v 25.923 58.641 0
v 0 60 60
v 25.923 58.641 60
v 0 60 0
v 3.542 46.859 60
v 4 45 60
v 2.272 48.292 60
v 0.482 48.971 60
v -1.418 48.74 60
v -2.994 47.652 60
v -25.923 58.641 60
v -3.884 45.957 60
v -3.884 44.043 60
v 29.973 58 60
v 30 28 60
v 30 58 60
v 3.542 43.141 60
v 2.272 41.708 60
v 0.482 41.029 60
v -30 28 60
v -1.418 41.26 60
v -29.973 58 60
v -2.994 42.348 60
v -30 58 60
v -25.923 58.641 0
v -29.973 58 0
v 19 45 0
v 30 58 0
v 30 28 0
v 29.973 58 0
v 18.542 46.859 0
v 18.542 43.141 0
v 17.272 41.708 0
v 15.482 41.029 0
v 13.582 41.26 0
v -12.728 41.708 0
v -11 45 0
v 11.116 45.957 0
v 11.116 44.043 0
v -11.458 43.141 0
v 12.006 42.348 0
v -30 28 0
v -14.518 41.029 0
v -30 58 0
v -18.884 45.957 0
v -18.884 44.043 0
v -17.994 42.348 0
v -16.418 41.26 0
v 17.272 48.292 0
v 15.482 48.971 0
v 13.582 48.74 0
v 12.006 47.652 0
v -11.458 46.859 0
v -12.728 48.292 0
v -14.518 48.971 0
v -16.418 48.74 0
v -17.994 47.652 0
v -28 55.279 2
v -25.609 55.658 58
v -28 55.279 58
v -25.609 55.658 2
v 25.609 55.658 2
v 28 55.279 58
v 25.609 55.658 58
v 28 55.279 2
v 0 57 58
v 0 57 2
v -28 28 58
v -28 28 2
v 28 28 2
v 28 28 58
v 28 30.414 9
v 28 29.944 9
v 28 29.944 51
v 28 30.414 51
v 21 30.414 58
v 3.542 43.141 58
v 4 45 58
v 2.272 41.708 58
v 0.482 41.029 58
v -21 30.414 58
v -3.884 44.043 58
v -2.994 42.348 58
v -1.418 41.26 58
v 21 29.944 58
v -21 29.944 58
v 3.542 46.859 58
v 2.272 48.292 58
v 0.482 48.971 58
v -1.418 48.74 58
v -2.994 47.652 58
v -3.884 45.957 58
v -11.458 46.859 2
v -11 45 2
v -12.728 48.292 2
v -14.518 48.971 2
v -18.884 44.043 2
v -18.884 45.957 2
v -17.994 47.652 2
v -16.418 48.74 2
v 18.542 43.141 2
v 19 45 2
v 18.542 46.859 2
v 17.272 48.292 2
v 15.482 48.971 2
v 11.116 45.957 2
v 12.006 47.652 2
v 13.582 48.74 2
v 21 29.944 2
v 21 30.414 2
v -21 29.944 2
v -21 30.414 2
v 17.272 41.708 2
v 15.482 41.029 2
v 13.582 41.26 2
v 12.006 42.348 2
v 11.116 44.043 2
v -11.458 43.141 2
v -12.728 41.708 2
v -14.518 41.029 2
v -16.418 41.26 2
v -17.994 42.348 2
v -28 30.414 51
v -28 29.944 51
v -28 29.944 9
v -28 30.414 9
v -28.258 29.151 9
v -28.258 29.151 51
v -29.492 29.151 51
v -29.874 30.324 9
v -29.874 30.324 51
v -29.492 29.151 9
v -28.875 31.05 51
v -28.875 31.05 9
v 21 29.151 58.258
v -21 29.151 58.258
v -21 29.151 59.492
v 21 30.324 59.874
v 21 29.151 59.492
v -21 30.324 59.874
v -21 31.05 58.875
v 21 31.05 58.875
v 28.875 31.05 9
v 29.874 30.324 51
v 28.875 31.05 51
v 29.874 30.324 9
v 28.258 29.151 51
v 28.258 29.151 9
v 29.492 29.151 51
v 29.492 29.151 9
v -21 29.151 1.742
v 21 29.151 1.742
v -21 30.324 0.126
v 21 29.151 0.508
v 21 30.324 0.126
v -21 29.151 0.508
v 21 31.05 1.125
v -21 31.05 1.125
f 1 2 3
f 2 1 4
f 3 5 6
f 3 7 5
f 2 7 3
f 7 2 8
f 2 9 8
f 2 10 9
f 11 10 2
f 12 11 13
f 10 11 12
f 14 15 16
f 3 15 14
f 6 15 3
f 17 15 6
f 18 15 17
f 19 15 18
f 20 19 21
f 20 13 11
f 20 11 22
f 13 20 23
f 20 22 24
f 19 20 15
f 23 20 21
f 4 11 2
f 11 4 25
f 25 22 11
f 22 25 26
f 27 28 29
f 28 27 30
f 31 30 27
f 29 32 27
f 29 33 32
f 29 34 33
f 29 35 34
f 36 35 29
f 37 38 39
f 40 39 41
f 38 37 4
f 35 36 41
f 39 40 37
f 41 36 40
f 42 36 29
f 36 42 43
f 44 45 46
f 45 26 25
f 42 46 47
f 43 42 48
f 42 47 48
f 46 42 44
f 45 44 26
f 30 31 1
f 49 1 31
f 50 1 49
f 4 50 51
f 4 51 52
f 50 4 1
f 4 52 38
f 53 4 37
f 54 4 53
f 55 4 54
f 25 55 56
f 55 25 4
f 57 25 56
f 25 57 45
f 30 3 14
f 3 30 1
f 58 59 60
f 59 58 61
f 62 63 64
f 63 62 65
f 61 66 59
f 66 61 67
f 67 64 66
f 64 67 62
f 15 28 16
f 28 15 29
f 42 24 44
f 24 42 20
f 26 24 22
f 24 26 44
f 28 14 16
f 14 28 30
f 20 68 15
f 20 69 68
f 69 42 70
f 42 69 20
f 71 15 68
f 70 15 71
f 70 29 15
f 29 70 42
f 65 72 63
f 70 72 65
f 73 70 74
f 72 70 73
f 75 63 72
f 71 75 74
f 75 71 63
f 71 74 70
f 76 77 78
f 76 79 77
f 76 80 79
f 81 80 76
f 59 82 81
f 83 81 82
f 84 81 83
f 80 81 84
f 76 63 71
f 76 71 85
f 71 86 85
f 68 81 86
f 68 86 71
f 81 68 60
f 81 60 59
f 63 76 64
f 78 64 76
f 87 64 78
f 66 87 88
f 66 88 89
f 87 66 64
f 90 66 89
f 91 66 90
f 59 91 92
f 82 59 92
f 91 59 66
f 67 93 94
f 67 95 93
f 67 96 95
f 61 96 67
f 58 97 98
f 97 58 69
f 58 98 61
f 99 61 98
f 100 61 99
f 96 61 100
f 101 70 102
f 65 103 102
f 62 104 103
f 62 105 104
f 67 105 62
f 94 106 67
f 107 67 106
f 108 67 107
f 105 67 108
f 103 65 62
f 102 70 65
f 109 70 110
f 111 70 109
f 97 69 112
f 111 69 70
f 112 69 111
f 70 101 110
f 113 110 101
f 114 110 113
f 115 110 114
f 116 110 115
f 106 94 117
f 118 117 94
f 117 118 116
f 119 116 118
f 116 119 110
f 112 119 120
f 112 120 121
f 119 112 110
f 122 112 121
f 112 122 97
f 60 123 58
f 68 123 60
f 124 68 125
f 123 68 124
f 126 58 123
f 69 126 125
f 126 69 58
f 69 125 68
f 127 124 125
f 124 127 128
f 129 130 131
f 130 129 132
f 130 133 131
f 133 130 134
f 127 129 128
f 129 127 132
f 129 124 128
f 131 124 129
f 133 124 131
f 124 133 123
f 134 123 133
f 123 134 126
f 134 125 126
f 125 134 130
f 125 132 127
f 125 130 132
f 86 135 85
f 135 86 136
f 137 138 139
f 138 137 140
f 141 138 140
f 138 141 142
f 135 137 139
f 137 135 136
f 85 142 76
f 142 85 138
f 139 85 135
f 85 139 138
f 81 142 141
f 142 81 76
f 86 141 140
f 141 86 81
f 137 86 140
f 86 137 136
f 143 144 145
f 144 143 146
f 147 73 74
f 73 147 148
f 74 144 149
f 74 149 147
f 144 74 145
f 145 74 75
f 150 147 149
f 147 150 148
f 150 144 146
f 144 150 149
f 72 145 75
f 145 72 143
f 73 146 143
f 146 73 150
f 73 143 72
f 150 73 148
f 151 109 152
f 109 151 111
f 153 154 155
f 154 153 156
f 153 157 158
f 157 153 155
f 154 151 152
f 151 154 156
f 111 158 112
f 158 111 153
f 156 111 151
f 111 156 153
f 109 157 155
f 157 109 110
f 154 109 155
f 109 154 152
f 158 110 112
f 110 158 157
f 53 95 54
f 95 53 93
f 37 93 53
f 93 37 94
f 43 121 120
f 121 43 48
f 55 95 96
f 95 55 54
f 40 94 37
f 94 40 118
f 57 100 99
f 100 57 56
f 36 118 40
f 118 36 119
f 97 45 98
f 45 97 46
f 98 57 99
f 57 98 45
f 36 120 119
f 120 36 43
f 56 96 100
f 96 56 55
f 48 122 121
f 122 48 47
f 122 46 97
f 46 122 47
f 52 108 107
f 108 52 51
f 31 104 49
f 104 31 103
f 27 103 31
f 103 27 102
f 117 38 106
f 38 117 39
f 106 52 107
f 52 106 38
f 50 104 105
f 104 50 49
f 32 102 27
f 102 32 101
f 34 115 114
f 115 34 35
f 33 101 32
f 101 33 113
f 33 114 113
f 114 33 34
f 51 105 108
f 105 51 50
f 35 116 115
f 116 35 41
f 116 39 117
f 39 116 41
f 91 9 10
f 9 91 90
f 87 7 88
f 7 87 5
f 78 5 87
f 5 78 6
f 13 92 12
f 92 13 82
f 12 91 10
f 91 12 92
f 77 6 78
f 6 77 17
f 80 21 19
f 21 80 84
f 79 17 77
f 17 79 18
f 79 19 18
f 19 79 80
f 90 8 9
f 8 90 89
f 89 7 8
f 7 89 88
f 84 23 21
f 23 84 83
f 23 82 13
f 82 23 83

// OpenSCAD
// Dimmer Gehäuse

Gehause = true;
Boden = false;

module Kreissegment(R,W,H) {

    difference() {
        cylinder(r=R,h=H,$fn=60);
        translate([0,0,-0.5])
        cylinder(r=R-W,h=H+1,$fn=60);
    }
}

module Sekante(R,W,H,S){
    translate([0,-R+H,0])
    difference(){
        Kreissegment(R,W,H);
        translate([0,-S,H/2])
        cube([2*R+1,2*R,H+1],center=true);
    }
}

module Box(){
    cube([60,30,60],center=true);
}

module Deckel() {
    intersection() {
        Sekante(248,3,60,40);
        translate([0,50,30])
        Box();
    }
}

module Haus() {
    translate([0,43,30])
    difference(){
        Box();
        translate([0,0,0])
        cube([56,32,56],center=true);
    }    
}

module Gewindehalter() {
    difference() {            
        cylinder(d=8,h=8,$fn=60,center=true);
        cylinder(d=3,h=9,$fn=60,center=true);
    }
}

module Platinenhalterung() {
    translate([0,4,0])
    for (i=[-1,1])
        for (j=[-1,0,1])
            rotate([90,0,0])
            translate([17.5*i,17.5*j,0])
            Gewindehalter();
}

module Rasten() {
    for (i=[0,90,180,270])
        rotate([i,0,90])
        translate([0,27.5,-20])
        cylinder(d=2,h=40);
}

module Boden(){
    translate([0,28,30])
    union(){
        cube([55,2,55],center=true);
        Platinenhalterung();
        Rasten();
    }
}

module Gehause() {
    difference(){
        union() {
            Deckel();
            Haus();
        }
        translate([-15,45,0])
        cylinder(d=8,h=10,center=true);
        translate([15,45,0])
        cylinder(d=8,h=10,center=true);
        
        translate([0,45,60])
        cylinder(d=8,h=10,center=true);
        
        translate([0,30,30])
        scale(1.05)
        Rasten();
    }
}

if (Gehause) Gehause();
if (Boden) Boden();
